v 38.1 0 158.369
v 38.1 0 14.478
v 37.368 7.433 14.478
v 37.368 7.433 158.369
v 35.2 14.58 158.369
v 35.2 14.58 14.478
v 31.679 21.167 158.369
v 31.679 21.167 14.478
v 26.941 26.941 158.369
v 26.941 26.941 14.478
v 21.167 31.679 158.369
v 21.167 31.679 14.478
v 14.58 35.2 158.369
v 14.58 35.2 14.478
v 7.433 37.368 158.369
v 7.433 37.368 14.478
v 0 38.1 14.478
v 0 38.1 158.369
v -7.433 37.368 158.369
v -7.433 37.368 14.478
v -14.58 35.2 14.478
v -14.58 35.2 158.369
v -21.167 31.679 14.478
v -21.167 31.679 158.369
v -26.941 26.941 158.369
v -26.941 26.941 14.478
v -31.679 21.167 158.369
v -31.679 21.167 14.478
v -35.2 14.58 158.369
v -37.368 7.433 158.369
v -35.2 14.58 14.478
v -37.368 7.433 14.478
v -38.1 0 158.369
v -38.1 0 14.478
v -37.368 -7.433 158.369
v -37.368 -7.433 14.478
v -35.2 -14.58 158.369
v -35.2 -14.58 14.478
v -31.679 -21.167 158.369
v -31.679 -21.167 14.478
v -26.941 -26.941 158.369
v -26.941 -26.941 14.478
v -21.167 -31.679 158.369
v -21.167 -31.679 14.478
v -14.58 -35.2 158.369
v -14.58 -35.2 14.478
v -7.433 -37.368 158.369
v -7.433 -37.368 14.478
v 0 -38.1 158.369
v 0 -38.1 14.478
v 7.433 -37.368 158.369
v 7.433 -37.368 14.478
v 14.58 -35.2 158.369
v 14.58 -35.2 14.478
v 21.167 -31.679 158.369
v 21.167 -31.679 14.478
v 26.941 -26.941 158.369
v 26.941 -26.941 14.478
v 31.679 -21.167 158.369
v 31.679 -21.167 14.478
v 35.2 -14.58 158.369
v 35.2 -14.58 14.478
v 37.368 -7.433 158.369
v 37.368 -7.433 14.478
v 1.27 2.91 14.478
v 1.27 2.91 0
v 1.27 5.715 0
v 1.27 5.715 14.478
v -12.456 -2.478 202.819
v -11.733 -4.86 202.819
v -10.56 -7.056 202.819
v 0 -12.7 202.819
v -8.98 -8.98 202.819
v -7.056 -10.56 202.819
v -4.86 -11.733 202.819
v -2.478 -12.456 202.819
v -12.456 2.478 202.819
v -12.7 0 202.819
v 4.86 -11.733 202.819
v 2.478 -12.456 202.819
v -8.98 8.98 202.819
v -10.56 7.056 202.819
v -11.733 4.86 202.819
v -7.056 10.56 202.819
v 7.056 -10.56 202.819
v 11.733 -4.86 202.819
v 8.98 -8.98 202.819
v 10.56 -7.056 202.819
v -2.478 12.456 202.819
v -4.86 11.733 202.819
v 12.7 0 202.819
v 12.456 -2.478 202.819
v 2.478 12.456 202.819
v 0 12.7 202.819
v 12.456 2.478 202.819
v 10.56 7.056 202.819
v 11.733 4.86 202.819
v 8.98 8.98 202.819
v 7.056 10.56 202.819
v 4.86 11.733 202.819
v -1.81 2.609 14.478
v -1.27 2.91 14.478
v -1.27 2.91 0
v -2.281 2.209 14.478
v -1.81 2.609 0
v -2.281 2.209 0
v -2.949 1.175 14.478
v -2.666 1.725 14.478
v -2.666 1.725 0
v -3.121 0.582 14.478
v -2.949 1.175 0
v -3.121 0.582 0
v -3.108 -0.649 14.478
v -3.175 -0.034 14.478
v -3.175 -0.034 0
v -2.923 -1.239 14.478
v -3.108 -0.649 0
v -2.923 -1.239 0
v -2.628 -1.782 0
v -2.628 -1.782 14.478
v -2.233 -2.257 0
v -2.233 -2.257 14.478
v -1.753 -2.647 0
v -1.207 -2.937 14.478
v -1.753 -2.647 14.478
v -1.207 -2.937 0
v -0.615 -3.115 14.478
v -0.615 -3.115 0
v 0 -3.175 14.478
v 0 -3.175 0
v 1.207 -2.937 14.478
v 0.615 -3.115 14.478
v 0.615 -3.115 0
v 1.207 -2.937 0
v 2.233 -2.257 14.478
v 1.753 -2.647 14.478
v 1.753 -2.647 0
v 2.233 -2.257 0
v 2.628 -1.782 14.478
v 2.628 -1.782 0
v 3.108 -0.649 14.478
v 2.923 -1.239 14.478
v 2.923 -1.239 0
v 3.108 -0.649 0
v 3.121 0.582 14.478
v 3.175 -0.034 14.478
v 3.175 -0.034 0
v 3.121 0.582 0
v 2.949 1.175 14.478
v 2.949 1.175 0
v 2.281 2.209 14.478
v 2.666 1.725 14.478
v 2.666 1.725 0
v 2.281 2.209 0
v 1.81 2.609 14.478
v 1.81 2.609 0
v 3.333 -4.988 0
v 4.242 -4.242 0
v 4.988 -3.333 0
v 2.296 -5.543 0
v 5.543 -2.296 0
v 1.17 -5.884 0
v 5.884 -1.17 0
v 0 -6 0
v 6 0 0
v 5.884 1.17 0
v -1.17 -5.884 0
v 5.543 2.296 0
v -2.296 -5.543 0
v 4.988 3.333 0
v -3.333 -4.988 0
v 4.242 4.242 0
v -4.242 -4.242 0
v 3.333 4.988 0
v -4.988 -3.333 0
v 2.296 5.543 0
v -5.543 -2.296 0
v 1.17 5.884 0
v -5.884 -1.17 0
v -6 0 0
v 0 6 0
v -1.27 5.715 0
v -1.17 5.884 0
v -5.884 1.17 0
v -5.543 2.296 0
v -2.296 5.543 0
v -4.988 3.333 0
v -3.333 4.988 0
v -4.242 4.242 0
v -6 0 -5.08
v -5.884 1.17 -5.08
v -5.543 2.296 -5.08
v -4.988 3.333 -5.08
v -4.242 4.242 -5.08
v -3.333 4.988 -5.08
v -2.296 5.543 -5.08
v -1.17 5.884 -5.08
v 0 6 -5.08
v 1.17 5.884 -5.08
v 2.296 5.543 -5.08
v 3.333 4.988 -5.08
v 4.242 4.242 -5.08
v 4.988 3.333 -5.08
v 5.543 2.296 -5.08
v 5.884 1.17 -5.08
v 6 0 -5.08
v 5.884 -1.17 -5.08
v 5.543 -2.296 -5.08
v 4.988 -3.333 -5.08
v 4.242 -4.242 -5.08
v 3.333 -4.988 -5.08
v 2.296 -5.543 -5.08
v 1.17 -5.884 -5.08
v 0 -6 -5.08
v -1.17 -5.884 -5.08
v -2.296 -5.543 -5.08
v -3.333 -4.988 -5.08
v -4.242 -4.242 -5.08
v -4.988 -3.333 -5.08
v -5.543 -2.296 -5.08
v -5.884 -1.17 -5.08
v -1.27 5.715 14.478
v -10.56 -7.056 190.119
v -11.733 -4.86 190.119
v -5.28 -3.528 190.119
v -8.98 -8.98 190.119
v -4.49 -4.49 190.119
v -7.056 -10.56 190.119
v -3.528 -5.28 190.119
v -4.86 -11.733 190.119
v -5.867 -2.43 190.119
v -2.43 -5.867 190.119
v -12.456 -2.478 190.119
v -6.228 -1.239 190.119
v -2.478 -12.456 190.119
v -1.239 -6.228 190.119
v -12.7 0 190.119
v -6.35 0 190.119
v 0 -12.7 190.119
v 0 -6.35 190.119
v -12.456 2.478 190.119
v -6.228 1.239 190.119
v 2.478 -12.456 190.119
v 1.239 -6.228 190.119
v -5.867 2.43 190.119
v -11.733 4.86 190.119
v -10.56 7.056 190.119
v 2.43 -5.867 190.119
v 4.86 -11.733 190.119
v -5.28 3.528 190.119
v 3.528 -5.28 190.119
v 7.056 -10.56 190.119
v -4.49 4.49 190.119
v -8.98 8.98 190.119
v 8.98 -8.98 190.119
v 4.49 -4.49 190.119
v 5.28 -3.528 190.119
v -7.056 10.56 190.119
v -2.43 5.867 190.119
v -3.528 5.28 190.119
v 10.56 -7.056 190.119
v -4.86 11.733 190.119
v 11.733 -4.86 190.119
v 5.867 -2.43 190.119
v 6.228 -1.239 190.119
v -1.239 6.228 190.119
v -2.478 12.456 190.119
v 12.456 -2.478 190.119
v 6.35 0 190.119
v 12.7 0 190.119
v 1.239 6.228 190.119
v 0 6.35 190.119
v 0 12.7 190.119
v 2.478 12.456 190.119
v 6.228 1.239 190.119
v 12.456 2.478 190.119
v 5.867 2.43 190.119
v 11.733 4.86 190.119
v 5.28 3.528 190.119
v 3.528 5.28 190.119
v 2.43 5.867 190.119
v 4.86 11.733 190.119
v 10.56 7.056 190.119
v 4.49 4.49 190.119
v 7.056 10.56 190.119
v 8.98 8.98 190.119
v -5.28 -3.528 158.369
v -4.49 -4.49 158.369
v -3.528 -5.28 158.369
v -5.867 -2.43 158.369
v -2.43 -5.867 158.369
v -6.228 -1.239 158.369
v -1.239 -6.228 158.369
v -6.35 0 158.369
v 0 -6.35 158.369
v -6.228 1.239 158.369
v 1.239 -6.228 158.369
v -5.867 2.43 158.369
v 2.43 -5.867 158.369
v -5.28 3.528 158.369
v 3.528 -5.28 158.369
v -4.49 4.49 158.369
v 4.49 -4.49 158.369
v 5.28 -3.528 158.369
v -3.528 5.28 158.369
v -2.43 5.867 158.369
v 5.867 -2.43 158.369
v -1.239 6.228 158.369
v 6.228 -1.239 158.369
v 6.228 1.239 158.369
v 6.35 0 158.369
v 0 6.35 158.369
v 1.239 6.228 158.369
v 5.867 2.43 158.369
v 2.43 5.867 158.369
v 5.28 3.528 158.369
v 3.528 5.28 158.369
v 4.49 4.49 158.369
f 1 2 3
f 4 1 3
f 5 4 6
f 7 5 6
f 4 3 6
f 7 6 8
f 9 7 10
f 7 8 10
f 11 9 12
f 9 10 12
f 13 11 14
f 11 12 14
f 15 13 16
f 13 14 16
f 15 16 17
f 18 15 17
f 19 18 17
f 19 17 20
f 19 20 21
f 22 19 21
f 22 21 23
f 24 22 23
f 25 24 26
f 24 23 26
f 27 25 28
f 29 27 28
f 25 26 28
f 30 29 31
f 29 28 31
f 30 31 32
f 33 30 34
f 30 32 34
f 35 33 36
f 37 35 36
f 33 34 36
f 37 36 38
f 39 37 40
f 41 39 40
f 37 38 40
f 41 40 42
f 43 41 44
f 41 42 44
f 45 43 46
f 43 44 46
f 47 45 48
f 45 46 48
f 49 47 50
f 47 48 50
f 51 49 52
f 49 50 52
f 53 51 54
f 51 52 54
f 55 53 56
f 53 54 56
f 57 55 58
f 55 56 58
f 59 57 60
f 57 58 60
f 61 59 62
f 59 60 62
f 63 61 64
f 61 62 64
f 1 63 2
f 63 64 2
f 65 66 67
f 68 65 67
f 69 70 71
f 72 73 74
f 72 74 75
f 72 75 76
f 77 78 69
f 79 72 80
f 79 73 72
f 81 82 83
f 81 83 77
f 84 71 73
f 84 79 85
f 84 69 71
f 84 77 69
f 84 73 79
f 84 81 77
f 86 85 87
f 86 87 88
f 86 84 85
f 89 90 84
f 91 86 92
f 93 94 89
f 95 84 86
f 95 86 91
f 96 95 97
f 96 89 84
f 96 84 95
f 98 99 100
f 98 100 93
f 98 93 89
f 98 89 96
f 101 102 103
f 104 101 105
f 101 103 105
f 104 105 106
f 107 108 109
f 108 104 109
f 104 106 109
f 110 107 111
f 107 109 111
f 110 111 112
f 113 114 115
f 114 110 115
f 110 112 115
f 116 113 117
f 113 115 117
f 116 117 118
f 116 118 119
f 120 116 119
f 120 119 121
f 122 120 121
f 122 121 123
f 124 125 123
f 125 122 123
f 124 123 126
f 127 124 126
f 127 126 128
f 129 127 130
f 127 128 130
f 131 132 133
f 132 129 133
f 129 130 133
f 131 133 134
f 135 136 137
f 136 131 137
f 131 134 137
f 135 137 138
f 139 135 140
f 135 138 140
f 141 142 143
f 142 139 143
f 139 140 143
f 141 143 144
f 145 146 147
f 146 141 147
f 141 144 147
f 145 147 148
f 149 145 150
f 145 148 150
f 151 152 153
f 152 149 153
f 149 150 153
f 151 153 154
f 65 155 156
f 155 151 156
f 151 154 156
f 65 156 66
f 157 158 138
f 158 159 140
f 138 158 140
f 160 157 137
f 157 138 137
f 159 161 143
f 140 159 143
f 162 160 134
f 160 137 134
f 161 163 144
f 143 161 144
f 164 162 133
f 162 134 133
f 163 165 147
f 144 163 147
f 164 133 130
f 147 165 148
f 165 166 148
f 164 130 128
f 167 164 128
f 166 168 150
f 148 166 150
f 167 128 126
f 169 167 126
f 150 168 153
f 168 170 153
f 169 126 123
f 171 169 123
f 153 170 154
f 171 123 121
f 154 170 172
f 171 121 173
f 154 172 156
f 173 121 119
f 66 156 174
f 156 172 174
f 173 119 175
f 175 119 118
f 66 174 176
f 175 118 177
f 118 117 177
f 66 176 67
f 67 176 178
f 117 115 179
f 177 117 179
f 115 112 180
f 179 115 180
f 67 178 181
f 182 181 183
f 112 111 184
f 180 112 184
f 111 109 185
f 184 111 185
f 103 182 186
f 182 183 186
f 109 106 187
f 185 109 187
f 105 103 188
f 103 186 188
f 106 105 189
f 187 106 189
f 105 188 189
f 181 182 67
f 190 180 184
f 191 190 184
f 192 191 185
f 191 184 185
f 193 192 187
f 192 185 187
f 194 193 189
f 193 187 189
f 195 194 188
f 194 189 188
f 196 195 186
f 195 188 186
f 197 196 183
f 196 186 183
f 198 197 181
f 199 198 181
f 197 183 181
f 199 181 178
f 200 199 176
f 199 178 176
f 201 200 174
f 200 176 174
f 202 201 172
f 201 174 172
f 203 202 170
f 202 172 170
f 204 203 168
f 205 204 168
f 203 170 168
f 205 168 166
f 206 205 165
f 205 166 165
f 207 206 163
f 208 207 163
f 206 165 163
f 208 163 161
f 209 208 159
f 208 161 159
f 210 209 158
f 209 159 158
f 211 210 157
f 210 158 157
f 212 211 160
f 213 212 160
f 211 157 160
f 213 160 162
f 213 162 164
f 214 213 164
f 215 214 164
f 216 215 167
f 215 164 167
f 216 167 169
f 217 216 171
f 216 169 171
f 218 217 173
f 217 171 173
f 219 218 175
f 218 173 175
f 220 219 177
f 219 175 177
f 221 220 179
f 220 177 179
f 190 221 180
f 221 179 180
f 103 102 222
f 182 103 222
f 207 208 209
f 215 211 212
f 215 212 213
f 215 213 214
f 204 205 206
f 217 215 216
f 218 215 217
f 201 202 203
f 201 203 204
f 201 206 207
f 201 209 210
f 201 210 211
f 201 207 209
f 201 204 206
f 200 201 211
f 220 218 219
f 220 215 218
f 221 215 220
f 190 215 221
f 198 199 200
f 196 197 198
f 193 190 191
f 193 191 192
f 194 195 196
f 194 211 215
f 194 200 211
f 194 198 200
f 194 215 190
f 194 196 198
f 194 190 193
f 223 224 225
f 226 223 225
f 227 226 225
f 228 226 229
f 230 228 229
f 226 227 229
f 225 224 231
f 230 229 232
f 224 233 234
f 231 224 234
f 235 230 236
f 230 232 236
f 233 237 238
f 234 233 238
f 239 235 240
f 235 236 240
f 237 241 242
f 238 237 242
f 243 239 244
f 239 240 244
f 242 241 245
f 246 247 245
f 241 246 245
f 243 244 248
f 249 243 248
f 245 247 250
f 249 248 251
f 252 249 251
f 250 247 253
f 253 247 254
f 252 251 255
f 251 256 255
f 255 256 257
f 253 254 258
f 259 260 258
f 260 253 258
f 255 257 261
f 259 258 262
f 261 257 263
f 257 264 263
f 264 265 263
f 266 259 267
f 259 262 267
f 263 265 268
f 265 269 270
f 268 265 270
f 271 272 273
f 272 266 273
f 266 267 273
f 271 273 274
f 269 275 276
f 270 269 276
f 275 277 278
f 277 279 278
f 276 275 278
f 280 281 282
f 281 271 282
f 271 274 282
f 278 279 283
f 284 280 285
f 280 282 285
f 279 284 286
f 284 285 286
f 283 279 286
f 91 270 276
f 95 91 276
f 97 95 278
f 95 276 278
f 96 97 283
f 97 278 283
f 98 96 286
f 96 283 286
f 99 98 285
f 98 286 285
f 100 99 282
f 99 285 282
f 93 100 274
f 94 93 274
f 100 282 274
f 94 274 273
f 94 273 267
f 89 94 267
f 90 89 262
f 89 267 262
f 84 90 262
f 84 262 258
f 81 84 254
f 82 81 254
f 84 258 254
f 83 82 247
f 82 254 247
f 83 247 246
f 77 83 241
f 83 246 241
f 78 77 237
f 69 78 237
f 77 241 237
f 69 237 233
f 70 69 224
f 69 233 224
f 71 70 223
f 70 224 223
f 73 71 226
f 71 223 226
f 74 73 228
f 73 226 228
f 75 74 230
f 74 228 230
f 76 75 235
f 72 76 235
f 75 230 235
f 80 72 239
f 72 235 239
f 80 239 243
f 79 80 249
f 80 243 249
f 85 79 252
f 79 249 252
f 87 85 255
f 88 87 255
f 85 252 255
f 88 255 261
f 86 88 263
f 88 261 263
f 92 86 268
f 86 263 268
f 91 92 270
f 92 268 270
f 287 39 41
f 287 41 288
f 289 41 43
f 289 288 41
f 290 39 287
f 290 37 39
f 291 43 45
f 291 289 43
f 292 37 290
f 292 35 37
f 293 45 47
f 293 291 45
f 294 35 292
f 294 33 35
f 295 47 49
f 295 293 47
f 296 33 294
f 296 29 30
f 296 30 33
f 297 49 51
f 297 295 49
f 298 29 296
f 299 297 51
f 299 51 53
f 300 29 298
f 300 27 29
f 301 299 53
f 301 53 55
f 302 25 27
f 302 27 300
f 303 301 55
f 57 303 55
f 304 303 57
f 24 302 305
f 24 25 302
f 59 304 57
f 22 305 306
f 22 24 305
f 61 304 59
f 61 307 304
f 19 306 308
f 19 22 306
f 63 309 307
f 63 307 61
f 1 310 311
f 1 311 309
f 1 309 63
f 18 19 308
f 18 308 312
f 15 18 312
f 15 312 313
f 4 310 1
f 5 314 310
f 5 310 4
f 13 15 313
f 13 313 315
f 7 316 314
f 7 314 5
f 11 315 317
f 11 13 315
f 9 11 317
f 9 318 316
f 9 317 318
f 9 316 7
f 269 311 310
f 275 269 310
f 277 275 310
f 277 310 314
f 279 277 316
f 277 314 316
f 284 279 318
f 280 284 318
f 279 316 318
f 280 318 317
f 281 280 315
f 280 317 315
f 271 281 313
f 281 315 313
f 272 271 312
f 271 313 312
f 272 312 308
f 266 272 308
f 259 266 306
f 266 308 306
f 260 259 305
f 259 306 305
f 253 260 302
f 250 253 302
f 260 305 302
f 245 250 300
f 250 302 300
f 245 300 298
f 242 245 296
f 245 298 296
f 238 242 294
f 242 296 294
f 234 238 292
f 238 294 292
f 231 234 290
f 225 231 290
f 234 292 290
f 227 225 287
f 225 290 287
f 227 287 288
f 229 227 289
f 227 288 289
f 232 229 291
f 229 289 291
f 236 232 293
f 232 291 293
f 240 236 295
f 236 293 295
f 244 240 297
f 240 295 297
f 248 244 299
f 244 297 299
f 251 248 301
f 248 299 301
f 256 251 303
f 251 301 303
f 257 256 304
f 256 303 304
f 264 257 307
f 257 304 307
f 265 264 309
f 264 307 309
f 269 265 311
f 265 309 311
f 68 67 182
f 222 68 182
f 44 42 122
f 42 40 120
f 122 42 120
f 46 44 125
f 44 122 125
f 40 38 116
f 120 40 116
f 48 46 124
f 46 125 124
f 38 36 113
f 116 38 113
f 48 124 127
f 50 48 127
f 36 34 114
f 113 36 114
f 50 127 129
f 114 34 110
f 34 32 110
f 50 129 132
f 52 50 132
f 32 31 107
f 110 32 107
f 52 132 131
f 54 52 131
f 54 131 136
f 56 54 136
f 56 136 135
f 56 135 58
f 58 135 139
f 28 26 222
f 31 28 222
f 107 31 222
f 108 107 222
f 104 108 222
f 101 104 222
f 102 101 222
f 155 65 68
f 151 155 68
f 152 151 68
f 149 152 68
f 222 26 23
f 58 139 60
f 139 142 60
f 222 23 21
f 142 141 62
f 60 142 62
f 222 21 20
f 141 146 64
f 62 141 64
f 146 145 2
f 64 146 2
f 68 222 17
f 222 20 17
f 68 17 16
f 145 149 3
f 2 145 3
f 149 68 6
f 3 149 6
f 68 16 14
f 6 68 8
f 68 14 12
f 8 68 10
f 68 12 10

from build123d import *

# Parameters (mm, degrees)
SKETCH1_R           = 3.175
BOSS_EXTRUDE1_DEPTH = 14.478
SKETCH2_R           = 38.1
BOSS_EXTRUDE2_DEPTH = 143.891
SKETCH3_W           = 2.54
SKETCH3_H           = 5.08
BOSS_EXTRUDE3_DEPTH = 14.478
SKETCH4_R           = 5.999533244
BOSS_EXTRUDE4_DEPTH = 5.08
SKETCH5_R           = 6.35
BOSS_EXTRUDE5_DEPTH = 31.75
SKETCH6_R           = 12.7
BOSS_EXTRUDE6_DEPTH = 12.7


with BuildPart() as part:
    # Sketch1 → Boss-Extrude1 (new body)
    with BuildSketch(Plane.XY):
        Circle(SKETCH1_R)
    extrude(amount=BOSS_EXTRUDE1_DEPTH)

    # Sketch2 → Boss-Extrude2 (add)
    with BuildSketch(Plane.XY.offset(14.478)):
        Circle(SKETCH2_R)
    extrude(amount=BOSS_EXTRUDE2_DEPTH)

    # Sketch3 → Boss-Extrude3 (add)
    with BuildSketch(Plane(origin=(0, 0, 0), x_dir=(-1, 0, 0), z_dir=(0, 0, -1))):
        with Locations((0, 3.175)):
            Rectangle(SKETCH3_W, SKETCH3_H)
    extrude(amount=-BOSS_EXTRUDE3_DEPTH)

    # Sketch4 → Boss-Extrude4 (add)
    with BuildSketch(Plane(origin=(0, 0, 0), x_dir=(-1, 0, 0), z_dir=(0, 0, -1))):
        Circle(SKETCH4_R)
    extrude(amount=BOSS_EXTRUDE4_DEPTH)

    # Sketch5 → Boss-Extrude5 (add)
    with BuildSketch(Plane.XY.offset(158.369)):
        Circle(SKETCH5_R)
    extrude(amount=BOSS_EXTRUDE5_DEPTH)

    # Sketch6 → Boss-Extrude6 (add)
    with BuildSketch(Plane.XY.offset(190.119)):
        Circle(SKETCH6_R)
    extrude(amount=BOSS_EXTRUDE6_DEPTH)


solid = part.part
